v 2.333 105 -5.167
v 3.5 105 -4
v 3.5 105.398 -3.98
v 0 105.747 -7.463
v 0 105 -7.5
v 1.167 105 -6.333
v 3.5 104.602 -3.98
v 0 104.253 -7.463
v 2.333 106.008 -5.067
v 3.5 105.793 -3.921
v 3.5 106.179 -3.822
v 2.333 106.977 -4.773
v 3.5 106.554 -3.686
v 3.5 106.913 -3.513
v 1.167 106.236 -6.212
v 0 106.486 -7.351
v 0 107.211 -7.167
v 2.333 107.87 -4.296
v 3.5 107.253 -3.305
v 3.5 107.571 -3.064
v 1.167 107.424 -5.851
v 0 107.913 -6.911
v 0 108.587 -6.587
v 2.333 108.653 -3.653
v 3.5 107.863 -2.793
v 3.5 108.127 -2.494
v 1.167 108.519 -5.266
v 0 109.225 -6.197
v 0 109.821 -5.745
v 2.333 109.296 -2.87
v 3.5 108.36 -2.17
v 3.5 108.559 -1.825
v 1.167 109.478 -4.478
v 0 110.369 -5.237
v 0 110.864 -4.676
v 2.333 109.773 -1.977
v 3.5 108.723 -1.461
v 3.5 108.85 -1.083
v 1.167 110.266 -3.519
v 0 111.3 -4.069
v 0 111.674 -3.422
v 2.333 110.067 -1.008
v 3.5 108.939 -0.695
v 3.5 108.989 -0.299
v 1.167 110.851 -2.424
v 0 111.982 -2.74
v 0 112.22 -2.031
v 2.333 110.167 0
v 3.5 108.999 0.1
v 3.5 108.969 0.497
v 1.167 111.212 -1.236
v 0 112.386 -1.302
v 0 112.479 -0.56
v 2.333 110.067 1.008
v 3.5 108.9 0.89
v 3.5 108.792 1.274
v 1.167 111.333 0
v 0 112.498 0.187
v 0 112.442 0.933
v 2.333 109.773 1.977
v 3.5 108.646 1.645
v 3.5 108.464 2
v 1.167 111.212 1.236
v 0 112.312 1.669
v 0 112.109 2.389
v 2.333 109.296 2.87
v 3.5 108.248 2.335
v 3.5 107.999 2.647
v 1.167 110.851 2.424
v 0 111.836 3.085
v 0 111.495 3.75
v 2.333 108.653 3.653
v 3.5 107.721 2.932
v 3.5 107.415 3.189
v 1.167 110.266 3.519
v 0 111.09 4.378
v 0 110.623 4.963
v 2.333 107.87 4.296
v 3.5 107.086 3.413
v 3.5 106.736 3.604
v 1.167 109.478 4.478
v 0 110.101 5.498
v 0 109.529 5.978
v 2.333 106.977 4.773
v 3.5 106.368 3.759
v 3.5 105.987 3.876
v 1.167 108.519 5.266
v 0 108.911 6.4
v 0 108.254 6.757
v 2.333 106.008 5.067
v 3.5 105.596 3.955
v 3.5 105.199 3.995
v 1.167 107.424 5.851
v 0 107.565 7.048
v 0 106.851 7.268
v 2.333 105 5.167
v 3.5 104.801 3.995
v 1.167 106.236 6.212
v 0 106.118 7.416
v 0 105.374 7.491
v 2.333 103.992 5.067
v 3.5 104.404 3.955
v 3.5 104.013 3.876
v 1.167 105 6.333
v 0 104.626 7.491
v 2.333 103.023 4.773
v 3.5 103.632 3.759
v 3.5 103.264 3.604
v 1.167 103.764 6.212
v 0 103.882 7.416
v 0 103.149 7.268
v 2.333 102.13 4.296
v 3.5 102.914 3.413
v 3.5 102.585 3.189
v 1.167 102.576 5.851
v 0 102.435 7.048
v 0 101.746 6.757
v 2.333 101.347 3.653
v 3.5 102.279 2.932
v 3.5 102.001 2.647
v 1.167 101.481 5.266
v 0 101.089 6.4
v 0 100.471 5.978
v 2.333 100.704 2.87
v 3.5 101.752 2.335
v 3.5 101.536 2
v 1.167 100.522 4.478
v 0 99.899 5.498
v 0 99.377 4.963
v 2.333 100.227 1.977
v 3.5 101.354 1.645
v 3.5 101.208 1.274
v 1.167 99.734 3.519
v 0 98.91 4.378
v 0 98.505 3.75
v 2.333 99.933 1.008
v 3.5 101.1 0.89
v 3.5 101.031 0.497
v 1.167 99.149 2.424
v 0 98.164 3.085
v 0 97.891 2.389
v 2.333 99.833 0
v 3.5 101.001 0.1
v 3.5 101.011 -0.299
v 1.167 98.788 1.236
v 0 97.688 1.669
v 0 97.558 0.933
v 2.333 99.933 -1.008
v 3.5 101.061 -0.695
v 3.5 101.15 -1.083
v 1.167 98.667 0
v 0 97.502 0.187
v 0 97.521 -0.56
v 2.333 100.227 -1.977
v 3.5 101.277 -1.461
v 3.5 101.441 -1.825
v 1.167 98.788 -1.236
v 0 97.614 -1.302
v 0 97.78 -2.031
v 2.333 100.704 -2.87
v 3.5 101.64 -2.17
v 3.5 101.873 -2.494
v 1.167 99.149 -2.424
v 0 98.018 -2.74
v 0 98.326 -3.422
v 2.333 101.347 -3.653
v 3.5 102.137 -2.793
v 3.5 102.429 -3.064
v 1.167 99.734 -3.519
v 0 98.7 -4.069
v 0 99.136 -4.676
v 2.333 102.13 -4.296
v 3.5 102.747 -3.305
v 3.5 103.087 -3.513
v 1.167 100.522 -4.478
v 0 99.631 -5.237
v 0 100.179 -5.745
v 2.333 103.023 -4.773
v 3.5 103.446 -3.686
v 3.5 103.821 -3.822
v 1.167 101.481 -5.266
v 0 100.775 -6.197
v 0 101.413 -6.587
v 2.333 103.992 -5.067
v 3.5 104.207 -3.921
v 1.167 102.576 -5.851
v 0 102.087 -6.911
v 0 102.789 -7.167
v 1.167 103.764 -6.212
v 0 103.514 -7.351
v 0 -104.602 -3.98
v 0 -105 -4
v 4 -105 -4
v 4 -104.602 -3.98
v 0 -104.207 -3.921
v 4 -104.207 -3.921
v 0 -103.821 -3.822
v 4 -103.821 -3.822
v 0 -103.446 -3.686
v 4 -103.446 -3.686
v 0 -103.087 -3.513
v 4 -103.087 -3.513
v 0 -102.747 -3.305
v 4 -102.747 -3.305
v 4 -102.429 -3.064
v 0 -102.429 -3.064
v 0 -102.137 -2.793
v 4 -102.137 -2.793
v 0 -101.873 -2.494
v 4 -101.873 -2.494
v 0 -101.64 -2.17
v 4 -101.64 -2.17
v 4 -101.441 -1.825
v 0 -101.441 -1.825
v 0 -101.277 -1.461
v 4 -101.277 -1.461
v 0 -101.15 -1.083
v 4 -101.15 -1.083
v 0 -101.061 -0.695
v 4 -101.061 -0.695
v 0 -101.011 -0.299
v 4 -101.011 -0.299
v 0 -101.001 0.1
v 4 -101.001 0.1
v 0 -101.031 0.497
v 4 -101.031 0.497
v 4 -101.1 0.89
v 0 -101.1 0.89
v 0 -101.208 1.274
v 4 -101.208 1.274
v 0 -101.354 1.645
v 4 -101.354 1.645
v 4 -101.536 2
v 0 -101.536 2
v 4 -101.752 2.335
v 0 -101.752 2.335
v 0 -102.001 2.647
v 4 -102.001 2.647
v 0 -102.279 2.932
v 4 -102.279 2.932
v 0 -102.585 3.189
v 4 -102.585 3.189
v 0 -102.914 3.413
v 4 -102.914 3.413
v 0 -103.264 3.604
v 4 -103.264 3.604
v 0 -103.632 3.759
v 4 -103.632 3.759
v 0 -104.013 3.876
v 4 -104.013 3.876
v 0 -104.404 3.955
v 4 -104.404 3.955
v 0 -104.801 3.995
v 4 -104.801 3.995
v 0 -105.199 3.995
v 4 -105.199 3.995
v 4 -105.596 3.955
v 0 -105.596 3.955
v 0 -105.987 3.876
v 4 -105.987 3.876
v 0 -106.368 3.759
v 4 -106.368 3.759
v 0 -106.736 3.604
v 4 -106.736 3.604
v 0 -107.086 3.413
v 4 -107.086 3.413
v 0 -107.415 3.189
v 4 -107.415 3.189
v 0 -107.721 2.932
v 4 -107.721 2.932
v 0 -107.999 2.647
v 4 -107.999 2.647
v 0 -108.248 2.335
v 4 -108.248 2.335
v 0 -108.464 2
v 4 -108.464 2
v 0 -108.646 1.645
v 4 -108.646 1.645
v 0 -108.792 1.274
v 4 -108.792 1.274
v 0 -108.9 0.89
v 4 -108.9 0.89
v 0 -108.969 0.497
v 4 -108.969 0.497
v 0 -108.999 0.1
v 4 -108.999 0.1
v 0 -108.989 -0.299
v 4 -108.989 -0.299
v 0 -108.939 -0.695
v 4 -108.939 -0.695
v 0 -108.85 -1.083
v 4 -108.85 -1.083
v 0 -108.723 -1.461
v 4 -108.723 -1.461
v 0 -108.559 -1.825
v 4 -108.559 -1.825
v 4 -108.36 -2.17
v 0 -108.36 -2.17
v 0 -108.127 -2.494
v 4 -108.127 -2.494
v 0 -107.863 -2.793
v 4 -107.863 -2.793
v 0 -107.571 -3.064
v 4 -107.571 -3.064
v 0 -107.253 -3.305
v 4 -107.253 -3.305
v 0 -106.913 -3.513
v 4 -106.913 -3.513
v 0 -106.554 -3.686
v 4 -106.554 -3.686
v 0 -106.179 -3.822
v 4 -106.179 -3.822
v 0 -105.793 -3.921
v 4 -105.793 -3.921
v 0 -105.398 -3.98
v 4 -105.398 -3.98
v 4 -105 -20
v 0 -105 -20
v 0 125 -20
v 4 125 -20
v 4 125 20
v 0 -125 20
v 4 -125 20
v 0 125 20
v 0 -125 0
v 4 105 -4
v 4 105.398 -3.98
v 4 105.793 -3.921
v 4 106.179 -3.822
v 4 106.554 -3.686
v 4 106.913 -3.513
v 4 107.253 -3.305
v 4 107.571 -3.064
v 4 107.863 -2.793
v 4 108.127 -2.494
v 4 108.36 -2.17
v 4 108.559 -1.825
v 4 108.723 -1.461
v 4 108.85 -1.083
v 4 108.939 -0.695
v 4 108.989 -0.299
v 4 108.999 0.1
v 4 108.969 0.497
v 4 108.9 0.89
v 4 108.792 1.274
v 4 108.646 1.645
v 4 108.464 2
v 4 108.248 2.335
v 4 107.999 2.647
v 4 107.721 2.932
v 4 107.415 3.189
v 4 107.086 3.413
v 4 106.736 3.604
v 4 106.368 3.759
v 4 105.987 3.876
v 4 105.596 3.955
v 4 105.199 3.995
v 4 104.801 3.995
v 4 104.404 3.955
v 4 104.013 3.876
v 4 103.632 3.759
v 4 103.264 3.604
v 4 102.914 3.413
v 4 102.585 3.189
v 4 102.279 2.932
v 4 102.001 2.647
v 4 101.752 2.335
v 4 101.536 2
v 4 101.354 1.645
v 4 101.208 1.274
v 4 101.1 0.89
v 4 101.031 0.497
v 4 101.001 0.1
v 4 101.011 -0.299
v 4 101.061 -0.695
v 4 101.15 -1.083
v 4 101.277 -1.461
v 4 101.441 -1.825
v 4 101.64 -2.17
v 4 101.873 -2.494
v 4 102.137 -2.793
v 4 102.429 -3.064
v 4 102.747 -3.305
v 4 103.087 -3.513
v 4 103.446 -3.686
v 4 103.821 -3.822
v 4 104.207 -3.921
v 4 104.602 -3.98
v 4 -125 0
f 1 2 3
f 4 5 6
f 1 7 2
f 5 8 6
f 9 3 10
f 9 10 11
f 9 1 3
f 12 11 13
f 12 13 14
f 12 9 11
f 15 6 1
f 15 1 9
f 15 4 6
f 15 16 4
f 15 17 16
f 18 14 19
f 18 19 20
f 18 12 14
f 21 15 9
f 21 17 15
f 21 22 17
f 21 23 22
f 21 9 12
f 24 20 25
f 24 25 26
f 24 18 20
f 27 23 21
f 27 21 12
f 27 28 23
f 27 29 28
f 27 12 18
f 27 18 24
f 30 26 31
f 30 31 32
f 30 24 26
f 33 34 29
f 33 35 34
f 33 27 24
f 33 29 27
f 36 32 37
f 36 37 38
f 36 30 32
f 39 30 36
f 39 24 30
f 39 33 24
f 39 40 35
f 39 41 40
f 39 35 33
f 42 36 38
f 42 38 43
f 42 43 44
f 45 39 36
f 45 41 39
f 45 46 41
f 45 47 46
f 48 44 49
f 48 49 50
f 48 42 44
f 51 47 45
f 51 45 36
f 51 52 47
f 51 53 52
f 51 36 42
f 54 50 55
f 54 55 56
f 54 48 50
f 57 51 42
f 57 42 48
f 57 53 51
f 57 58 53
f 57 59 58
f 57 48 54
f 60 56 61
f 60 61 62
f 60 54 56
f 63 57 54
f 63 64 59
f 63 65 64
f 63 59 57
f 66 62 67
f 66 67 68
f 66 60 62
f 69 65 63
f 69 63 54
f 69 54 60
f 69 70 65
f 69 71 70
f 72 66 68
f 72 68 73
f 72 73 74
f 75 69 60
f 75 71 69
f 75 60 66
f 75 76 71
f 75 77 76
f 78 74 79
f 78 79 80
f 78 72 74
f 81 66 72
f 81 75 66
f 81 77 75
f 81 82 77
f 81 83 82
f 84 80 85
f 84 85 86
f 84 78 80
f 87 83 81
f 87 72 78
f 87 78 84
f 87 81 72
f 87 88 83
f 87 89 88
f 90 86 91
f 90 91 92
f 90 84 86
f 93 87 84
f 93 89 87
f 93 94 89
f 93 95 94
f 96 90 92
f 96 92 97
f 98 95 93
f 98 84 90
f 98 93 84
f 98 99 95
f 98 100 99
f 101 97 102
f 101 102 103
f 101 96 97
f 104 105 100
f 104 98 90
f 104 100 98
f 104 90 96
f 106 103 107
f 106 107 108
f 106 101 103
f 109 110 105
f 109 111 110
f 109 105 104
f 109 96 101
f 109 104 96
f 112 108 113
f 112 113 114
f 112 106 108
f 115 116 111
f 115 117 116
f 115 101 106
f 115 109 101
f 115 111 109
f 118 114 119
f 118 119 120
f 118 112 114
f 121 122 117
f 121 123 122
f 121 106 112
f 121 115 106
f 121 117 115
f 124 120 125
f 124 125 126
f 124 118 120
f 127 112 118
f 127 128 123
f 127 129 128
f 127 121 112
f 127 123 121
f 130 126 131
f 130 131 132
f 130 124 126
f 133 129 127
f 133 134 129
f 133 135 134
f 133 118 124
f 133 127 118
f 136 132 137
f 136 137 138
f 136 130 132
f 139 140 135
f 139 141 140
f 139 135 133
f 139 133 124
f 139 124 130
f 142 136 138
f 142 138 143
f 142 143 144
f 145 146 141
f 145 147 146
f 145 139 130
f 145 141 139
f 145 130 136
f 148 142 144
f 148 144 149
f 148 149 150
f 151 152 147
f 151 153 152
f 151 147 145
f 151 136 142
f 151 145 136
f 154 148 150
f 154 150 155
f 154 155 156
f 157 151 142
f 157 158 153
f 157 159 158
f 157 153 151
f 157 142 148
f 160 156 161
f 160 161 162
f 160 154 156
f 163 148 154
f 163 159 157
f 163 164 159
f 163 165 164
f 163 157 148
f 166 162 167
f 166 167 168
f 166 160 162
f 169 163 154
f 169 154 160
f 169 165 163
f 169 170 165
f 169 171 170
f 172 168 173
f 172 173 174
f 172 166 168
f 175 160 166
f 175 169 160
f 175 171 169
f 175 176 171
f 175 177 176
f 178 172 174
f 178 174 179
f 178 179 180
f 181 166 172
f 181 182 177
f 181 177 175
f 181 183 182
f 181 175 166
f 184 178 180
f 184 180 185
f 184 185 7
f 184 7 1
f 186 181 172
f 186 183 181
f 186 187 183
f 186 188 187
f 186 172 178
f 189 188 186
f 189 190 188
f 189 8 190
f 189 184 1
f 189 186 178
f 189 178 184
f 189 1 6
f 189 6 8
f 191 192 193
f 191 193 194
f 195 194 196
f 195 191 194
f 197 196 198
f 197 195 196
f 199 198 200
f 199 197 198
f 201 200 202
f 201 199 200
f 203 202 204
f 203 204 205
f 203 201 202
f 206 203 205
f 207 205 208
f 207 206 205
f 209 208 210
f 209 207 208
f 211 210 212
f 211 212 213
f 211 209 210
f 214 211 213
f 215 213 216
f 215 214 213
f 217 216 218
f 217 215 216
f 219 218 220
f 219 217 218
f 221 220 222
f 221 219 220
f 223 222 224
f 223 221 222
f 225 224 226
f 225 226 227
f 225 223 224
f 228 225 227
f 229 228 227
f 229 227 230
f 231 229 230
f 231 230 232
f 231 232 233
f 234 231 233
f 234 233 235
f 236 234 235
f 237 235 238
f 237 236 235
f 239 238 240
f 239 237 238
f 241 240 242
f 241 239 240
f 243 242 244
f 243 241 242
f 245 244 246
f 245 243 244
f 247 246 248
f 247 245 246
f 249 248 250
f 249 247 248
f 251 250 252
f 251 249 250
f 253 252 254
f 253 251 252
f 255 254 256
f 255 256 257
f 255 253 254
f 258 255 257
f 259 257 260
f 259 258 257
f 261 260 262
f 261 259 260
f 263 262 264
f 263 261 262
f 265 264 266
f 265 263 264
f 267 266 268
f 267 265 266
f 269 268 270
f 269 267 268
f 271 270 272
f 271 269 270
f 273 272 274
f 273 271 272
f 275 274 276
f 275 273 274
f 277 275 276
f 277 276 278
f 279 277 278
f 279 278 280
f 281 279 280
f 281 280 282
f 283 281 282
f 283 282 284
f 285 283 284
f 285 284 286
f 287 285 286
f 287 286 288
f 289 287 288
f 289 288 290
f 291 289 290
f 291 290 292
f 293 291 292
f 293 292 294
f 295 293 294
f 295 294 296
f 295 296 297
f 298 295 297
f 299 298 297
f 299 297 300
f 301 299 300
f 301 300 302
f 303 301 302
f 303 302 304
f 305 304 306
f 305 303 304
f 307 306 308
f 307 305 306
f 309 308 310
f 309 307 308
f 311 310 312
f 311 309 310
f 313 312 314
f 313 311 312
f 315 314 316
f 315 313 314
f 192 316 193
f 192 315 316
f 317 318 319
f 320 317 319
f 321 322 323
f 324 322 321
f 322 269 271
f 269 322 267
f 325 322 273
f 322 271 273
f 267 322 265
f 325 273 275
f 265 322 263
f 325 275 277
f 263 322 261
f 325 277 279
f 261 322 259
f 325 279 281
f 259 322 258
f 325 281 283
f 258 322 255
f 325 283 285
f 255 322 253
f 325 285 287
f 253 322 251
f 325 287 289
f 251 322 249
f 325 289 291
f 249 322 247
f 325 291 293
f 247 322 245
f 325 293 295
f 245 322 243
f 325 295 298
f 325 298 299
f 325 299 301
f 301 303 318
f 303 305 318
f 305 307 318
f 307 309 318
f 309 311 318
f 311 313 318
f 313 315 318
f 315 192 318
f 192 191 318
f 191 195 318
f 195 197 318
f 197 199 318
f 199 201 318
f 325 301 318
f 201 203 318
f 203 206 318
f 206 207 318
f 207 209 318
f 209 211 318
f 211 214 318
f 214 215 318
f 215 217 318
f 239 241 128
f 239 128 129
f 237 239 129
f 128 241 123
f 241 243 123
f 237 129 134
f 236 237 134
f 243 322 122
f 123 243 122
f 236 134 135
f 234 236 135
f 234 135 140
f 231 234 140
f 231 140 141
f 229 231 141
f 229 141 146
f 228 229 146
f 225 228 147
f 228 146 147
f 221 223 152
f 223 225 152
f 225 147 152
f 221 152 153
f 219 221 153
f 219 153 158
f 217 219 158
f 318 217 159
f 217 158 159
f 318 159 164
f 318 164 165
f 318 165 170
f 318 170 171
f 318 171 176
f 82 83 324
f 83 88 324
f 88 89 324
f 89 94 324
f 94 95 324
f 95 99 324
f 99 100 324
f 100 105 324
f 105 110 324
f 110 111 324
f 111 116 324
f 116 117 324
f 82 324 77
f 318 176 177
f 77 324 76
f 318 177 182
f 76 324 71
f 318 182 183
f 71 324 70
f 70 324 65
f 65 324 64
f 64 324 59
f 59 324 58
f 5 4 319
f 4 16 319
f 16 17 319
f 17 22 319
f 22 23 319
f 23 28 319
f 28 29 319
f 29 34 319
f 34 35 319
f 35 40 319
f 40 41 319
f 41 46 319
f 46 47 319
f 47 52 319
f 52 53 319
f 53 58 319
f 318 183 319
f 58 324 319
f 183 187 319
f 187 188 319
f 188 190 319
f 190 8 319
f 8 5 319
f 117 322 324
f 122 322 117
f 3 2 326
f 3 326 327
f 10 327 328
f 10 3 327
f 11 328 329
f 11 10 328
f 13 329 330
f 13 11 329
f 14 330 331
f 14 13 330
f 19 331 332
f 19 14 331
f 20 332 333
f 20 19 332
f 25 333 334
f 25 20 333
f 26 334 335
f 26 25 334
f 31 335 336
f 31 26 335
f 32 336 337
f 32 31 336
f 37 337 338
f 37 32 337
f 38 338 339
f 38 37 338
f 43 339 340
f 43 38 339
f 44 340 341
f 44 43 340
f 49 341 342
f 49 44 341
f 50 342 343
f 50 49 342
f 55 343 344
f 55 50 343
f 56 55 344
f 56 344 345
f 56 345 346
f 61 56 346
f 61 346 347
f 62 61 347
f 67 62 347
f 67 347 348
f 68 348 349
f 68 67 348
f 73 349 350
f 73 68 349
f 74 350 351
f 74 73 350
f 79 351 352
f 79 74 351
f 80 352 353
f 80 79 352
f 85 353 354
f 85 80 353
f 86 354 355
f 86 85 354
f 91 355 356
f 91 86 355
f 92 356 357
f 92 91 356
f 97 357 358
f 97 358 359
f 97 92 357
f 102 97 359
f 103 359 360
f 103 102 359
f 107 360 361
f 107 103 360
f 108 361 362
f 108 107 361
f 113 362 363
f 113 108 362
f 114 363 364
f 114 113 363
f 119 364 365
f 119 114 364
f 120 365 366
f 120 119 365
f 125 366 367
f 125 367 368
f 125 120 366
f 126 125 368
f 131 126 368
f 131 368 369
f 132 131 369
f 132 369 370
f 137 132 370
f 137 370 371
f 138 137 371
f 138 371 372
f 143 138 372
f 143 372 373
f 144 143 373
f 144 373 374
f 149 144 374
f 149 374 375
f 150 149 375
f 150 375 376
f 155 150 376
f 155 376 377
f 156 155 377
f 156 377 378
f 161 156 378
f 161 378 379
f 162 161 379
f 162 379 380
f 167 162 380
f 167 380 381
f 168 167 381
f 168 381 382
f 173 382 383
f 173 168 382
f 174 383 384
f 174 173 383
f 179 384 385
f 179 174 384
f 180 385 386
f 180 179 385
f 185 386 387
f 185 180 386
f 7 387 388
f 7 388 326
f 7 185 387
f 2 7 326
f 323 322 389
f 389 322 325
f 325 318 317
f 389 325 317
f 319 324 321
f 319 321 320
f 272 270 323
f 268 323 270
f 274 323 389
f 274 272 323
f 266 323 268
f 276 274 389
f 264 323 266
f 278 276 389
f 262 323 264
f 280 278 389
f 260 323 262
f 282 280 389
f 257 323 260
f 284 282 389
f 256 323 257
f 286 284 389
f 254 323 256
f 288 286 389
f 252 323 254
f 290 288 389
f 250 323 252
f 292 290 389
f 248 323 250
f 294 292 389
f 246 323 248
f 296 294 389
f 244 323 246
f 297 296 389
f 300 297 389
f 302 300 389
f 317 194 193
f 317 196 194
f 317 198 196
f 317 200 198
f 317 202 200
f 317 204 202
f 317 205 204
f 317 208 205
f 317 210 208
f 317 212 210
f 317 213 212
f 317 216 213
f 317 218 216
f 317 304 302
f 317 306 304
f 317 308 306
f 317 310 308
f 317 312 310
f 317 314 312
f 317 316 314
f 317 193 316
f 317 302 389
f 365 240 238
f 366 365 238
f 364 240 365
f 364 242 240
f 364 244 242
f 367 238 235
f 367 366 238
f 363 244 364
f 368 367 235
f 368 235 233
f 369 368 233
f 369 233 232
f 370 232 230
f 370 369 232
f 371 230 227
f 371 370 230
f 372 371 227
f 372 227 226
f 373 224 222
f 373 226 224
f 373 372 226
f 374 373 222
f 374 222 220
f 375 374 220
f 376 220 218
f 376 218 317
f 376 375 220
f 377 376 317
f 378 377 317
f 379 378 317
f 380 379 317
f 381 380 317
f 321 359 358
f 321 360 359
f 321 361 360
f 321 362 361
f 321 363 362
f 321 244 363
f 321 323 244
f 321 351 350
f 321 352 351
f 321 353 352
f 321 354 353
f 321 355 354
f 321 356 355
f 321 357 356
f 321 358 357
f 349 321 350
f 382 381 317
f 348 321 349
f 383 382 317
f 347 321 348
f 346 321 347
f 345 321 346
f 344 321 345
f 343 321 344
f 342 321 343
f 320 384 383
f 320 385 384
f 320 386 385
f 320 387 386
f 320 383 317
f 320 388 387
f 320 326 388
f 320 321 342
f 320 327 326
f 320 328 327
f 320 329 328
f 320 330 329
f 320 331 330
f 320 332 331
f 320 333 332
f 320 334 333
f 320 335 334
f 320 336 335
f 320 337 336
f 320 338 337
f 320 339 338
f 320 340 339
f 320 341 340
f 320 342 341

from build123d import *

# Parameters (mm, degrees)
SKETCH1_W           = 40
SKETCH1_H           = 250
SKETCH1_R           = 4
BOSS_EXTRUDE1_DEPTH = 4
CHAMFER1_SIZE       = 3.5
CHAMFER3_SIZE       = 20


with BuildPart() as part:
    # Sketch1 → Boss-Extrude1 (new body)
    with BuildSketch(Plane(origin=(0, 0, 0), x_dir=(0, 0, -1), z_dir=(1, 0, 0))):
        Rectangle(SKETCH1_W, SKETCH1_H)
        with Locations((0, 105)):
            Circle(SKETCH1_R, mode=Mode.SUBTRACT)
        with Locations((0, -105)):
            Circle(SKETCH1_R, mode=Mode.SUBTRACT)
    extrude(amount=BOSS_EXTRUDE1_DEPTH)

    # Chamfer1
    chamfer1_edges = [part.edges().sort_by_distance(p)[0] for p in [
        (0, 105, 4),
    ]]
    chamfer(chamfer1_edges, length=CHAMFER1_SIZE)

    # Chamfer3
    chamfer3_edges = [part.edges().sort_by_distance(p)[0] for p in [
        (2, -125, -20),
    ]]
    chamfer(chamfer3_edges, length=CHAMFER3_SIZE)


solid = part.part
